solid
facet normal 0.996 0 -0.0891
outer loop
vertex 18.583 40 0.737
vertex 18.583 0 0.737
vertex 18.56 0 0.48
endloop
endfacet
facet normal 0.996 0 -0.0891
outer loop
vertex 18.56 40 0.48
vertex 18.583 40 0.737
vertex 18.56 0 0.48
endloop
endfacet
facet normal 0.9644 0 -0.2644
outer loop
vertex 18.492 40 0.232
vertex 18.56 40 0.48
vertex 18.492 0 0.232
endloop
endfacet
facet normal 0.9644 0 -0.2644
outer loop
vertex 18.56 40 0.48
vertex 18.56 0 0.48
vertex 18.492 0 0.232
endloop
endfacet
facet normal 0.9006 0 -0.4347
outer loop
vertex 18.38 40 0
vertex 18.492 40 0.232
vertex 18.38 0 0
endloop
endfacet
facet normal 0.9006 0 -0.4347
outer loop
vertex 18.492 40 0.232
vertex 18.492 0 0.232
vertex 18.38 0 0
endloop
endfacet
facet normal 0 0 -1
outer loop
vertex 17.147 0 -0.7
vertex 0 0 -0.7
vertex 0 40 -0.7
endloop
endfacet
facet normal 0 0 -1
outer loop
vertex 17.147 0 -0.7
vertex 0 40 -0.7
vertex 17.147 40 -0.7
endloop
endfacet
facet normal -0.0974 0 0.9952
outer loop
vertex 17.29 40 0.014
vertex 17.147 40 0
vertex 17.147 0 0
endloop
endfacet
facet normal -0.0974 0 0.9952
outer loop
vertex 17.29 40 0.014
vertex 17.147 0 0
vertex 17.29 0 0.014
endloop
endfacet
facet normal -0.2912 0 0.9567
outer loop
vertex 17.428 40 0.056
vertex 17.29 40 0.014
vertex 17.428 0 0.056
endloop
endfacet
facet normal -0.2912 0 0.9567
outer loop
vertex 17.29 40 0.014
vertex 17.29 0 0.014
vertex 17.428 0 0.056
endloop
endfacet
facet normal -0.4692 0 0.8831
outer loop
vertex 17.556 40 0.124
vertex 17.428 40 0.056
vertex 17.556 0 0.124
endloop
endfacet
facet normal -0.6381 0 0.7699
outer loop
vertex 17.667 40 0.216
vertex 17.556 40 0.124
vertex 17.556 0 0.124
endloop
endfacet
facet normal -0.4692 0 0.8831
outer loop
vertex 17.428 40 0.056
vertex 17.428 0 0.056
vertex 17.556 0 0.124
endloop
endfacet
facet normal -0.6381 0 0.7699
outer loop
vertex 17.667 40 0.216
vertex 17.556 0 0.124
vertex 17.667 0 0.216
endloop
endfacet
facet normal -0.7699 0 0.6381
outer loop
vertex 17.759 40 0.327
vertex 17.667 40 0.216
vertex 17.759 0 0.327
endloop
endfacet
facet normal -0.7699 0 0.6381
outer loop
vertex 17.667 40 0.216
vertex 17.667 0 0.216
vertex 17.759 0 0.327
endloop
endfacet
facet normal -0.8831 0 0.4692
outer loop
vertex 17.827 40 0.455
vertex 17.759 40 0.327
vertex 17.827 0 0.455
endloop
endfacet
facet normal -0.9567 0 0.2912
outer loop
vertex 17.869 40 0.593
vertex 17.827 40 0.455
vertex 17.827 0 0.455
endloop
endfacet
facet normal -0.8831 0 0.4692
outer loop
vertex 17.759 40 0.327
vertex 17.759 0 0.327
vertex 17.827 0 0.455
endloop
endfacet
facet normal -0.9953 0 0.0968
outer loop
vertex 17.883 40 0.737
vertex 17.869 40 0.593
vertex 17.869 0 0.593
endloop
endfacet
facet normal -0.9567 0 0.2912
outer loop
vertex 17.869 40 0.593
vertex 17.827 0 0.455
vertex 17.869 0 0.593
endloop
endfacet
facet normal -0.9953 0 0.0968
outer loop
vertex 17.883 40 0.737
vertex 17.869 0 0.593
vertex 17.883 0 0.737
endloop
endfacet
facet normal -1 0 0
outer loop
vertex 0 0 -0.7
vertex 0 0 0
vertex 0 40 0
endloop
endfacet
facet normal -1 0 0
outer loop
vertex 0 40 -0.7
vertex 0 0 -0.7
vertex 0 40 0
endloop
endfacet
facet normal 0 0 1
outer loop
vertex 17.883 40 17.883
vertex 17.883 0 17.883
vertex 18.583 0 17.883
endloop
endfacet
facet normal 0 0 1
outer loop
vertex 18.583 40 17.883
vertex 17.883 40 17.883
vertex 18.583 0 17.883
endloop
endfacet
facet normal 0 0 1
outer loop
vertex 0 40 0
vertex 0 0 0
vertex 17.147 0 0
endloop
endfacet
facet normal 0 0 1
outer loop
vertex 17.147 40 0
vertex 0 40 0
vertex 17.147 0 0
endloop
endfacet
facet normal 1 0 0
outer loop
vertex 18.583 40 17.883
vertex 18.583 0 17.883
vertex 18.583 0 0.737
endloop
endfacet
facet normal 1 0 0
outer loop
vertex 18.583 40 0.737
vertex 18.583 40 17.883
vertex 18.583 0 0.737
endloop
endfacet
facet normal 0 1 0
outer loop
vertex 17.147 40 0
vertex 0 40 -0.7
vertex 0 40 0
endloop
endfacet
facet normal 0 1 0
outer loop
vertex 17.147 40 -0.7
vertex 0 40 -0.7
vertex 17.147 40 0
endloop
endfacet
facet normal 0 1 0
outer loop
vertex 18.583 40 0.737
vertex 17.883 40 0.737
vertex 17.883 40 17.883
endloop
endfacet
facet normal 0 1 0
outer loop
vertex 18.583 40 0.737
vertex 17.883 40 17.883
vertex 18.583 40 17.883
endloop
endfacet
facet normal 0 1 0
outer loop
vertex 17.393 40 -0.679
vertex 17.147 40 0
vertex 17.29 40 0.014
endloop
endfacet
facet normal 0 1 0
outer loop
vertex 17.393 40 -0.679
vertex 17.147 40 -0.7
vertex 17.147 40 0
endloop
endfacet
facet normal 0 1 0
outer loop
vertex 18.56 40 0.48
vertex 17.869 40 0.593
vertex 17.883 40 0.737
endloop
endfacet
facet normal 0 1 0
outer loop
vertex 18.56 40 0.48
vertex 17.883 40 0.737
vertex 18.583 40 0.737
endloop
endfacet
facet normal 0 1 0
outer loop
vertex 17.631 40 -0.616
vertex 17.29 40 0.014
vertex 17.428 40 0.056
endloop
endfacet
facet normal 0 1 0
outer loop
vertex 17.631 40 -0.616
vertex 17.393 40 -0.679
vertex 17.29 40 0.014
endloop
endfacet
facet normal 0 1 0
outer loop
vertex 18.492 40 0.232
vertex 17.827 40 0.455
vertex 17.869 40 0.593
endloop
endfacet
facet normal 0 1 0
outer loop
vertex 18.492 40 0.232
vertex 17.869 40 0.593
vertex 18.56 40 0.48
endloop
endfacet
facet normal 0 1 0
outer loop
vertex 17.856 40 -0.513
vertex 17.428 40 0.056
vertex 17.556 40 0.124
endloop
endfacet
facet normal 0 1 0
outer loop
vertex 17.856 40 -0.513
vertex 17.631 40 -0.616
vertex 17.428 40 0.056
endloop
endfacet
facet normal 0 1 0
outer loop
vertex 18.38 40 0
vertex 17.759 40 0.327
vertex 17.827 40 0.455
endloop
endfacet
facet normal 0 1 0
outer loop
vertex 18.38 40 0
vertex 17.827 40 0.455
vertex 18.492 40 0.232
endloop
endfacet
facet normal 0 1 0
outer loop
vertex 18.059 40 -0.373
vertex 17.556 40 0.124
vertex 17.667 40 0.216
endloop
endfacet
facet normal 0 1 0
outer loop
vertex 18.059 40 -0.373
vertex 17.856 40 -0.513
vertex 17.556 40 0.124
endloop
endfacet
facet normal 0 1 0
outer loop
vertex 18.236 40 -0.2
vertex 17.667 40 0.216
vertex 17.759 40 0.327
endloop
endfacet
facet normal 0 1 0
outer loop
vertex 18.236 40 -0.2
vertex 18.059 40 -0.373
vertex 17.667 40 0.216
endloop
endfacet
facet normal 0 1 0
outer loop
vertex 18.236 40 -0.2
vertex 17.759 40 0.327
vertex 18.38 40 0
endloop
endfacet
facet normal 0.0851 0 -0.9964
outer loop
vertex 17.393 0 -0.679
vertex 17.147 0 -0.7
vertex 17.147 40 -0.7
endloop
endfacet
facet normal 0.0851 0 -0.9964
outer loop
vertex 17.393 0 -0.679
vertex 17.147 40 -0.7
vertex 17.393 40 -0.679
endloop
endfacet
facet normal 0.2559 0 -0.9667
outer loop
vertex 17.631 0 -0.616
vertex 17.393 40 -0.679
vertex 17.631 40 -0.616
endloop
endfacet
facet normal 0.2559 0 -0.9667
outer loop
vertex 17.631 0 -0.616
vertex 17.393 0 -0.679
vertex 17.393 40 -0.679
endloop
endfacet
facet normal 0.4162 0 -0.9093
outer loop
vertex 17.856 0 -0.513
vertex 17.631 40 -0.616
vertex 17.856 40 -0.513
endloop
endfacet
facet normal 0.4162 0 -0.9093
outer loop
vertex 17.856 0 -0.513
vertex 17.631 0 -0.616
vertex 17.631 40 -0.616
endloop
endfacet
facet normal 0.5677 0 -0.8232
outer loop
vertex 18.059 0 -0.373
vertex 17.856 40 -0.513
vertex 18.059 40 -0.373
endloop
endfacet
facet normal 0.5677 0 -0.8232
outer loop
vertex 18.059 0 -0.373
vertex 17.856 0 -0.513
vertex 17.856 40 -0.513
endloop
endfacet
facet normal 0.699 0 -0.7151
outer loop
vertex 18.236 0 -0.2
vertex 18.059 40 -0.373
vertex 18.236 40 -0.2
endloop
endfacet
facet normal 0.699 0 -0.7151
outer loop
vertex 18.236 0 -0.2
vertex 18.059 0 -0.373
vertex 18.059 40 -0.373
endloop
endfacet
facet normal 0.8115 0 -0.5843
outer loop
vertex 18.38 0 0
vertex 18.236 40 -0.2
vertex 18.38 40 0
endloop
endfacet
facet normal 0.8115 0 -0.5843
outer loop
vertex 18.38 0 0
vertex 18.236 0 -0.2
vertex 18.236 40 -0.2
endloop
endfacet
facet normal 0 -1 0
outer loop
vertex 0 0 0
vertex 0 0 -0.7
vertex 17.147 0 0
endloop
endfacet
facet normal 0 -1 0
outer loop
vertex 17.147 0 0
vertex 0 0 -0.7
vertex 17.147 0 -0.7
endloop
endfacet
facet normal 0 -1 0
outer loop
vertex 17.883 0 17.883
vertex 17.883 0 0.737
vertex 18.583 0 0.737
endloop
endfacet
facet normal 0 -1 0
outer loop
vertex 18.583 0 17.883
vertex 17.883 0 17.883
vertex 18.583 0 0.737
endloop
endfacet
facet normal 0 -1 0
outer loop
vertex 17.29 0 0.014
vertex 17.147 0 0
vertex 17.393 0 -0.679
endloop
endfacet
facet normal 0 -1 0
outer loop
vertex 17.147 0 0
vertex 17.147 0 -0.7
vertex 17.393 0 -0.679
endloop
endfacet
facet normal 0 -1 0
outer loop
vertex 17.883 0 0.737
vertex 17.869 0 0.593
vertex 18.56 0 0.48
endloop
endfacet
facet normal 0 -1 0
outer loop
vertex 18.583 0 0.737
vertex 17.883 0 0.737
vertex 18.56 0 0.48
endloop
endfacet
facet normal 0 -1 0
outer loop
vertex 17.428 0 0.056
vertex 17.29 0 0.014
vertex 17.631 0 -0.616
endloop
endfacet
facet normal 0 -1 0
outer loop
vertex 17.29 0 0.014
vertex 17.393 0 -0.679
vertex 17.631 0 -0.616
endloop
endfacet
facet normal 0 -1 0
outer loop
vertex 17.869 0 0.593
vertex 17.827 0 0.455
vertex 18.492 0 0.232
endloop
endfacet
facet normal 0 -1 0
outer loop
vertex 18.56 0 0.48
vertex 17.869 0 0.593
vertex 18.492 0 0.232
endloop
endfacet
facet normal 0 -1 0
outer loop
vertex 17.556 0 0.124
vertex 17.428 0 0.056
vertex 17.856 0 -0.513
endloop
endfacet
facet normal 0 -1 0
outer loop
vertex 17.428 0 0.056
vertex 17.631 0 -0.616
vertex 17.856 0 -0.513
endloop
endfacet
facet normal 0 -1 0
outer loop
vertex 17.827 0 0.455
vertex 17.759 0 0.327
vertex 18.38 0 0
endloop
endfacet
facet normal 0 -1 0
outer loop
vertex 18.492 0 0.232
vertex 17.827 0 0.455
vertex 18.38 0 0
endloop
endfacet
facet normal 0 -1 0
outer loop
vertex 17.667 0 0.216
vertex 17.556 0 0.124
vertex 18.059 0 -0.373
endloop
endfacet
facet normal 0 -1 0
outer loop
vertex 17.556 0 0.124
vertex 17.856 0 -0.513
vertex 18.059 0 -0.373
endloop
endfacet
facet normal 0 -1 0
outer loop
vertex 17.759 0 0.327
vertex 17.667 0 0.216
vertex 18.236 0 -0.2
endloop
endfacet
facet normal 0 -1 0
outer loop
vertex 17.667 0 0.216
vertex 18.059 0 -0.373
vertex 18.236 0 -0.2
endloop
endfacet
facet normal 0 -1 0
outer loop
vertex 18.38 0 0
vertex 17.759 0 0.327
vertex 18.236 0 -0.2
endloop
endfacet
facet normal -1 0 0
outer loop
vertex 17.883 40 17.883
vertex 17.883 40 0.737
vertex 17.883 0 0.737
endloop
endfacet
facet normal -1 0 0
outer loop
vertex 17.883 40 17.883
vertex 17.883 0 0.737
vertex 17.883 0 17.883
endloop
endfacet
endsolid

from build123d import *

# Parameters (mm, degrees)
SKETCH1_W              = 36
SKETCH1_H              = 40
BASE_FLANGE1_DEPTH     = 0.7
SKETCHED_BEND1_DEPTH   = 40
SKETCHED_BEND1_2_DEPTH = 40


# Read off the part's stored shape, not the designer's step: Sketched Bend1
# Sheet-metal steps are written as plain solids
with BuildPart() as part:
    # Sketch1 → Base-Flange1 (new body)
    with BuildSketch(Plane.XY):
        with Locations((18, 20)):
            Rectangle(SKETCH1_W, SKETCH1_H)
    extrude(amount=-BASE_FLANGE1_DEPTH)

    # Sketched Bend1 outline → Sketched Bend1 (cut)
    with BuildSketch(Plane(origin=(0, 0, 0), x_dir=(1, 0, 0), z_dir=(0, 1, 0))):
        with BuildLine():
            ThreePointArc((17.146586356, 0.7), (17.855677324, 0.512803682), (18.379971941, 0))
            Line((18.379971941, 0), (36, 0))
            Line((36, 0), (36, 0.7))
            Line((36, 0.7), (17.146586356, 0.7))
        make_face()
    extrude(amount=SKETCHED_BEND1_DEPTH, mode=Mode.SUBTRACT)

    # Sketched Bend1 2 outline → Sketched Bend1 2 (add)
    with BuildSketch(Plane(origin=(0, 0, 0), x_dir=(1, 0, 0), z_dir=(0, 1, 0))):
        with BuildLine():
            Line((17.883186356, -0.7366), (17.883186356, -17.883186356))
            Line((17.883186356, -17.883186356), (18.583186356, -17.883186356))
            Line((18.583186356, -17.883186356), (18.583186356, -0.7366))
            ThreePointArc((18.583186356, -0.7366), (18.531451203, -0.354541216), (18.379971941, 0))
            Line((18.379971941, 0), (17.146586356, 0))
            ThreePointArc((17.146586356, 0), (17.667441211, -0.215745145), (17.883186356, -0.7366))
        make_face()
    extrude(amount=SKETCHED_BEND1_2_DEPTH)


solid = part.part
